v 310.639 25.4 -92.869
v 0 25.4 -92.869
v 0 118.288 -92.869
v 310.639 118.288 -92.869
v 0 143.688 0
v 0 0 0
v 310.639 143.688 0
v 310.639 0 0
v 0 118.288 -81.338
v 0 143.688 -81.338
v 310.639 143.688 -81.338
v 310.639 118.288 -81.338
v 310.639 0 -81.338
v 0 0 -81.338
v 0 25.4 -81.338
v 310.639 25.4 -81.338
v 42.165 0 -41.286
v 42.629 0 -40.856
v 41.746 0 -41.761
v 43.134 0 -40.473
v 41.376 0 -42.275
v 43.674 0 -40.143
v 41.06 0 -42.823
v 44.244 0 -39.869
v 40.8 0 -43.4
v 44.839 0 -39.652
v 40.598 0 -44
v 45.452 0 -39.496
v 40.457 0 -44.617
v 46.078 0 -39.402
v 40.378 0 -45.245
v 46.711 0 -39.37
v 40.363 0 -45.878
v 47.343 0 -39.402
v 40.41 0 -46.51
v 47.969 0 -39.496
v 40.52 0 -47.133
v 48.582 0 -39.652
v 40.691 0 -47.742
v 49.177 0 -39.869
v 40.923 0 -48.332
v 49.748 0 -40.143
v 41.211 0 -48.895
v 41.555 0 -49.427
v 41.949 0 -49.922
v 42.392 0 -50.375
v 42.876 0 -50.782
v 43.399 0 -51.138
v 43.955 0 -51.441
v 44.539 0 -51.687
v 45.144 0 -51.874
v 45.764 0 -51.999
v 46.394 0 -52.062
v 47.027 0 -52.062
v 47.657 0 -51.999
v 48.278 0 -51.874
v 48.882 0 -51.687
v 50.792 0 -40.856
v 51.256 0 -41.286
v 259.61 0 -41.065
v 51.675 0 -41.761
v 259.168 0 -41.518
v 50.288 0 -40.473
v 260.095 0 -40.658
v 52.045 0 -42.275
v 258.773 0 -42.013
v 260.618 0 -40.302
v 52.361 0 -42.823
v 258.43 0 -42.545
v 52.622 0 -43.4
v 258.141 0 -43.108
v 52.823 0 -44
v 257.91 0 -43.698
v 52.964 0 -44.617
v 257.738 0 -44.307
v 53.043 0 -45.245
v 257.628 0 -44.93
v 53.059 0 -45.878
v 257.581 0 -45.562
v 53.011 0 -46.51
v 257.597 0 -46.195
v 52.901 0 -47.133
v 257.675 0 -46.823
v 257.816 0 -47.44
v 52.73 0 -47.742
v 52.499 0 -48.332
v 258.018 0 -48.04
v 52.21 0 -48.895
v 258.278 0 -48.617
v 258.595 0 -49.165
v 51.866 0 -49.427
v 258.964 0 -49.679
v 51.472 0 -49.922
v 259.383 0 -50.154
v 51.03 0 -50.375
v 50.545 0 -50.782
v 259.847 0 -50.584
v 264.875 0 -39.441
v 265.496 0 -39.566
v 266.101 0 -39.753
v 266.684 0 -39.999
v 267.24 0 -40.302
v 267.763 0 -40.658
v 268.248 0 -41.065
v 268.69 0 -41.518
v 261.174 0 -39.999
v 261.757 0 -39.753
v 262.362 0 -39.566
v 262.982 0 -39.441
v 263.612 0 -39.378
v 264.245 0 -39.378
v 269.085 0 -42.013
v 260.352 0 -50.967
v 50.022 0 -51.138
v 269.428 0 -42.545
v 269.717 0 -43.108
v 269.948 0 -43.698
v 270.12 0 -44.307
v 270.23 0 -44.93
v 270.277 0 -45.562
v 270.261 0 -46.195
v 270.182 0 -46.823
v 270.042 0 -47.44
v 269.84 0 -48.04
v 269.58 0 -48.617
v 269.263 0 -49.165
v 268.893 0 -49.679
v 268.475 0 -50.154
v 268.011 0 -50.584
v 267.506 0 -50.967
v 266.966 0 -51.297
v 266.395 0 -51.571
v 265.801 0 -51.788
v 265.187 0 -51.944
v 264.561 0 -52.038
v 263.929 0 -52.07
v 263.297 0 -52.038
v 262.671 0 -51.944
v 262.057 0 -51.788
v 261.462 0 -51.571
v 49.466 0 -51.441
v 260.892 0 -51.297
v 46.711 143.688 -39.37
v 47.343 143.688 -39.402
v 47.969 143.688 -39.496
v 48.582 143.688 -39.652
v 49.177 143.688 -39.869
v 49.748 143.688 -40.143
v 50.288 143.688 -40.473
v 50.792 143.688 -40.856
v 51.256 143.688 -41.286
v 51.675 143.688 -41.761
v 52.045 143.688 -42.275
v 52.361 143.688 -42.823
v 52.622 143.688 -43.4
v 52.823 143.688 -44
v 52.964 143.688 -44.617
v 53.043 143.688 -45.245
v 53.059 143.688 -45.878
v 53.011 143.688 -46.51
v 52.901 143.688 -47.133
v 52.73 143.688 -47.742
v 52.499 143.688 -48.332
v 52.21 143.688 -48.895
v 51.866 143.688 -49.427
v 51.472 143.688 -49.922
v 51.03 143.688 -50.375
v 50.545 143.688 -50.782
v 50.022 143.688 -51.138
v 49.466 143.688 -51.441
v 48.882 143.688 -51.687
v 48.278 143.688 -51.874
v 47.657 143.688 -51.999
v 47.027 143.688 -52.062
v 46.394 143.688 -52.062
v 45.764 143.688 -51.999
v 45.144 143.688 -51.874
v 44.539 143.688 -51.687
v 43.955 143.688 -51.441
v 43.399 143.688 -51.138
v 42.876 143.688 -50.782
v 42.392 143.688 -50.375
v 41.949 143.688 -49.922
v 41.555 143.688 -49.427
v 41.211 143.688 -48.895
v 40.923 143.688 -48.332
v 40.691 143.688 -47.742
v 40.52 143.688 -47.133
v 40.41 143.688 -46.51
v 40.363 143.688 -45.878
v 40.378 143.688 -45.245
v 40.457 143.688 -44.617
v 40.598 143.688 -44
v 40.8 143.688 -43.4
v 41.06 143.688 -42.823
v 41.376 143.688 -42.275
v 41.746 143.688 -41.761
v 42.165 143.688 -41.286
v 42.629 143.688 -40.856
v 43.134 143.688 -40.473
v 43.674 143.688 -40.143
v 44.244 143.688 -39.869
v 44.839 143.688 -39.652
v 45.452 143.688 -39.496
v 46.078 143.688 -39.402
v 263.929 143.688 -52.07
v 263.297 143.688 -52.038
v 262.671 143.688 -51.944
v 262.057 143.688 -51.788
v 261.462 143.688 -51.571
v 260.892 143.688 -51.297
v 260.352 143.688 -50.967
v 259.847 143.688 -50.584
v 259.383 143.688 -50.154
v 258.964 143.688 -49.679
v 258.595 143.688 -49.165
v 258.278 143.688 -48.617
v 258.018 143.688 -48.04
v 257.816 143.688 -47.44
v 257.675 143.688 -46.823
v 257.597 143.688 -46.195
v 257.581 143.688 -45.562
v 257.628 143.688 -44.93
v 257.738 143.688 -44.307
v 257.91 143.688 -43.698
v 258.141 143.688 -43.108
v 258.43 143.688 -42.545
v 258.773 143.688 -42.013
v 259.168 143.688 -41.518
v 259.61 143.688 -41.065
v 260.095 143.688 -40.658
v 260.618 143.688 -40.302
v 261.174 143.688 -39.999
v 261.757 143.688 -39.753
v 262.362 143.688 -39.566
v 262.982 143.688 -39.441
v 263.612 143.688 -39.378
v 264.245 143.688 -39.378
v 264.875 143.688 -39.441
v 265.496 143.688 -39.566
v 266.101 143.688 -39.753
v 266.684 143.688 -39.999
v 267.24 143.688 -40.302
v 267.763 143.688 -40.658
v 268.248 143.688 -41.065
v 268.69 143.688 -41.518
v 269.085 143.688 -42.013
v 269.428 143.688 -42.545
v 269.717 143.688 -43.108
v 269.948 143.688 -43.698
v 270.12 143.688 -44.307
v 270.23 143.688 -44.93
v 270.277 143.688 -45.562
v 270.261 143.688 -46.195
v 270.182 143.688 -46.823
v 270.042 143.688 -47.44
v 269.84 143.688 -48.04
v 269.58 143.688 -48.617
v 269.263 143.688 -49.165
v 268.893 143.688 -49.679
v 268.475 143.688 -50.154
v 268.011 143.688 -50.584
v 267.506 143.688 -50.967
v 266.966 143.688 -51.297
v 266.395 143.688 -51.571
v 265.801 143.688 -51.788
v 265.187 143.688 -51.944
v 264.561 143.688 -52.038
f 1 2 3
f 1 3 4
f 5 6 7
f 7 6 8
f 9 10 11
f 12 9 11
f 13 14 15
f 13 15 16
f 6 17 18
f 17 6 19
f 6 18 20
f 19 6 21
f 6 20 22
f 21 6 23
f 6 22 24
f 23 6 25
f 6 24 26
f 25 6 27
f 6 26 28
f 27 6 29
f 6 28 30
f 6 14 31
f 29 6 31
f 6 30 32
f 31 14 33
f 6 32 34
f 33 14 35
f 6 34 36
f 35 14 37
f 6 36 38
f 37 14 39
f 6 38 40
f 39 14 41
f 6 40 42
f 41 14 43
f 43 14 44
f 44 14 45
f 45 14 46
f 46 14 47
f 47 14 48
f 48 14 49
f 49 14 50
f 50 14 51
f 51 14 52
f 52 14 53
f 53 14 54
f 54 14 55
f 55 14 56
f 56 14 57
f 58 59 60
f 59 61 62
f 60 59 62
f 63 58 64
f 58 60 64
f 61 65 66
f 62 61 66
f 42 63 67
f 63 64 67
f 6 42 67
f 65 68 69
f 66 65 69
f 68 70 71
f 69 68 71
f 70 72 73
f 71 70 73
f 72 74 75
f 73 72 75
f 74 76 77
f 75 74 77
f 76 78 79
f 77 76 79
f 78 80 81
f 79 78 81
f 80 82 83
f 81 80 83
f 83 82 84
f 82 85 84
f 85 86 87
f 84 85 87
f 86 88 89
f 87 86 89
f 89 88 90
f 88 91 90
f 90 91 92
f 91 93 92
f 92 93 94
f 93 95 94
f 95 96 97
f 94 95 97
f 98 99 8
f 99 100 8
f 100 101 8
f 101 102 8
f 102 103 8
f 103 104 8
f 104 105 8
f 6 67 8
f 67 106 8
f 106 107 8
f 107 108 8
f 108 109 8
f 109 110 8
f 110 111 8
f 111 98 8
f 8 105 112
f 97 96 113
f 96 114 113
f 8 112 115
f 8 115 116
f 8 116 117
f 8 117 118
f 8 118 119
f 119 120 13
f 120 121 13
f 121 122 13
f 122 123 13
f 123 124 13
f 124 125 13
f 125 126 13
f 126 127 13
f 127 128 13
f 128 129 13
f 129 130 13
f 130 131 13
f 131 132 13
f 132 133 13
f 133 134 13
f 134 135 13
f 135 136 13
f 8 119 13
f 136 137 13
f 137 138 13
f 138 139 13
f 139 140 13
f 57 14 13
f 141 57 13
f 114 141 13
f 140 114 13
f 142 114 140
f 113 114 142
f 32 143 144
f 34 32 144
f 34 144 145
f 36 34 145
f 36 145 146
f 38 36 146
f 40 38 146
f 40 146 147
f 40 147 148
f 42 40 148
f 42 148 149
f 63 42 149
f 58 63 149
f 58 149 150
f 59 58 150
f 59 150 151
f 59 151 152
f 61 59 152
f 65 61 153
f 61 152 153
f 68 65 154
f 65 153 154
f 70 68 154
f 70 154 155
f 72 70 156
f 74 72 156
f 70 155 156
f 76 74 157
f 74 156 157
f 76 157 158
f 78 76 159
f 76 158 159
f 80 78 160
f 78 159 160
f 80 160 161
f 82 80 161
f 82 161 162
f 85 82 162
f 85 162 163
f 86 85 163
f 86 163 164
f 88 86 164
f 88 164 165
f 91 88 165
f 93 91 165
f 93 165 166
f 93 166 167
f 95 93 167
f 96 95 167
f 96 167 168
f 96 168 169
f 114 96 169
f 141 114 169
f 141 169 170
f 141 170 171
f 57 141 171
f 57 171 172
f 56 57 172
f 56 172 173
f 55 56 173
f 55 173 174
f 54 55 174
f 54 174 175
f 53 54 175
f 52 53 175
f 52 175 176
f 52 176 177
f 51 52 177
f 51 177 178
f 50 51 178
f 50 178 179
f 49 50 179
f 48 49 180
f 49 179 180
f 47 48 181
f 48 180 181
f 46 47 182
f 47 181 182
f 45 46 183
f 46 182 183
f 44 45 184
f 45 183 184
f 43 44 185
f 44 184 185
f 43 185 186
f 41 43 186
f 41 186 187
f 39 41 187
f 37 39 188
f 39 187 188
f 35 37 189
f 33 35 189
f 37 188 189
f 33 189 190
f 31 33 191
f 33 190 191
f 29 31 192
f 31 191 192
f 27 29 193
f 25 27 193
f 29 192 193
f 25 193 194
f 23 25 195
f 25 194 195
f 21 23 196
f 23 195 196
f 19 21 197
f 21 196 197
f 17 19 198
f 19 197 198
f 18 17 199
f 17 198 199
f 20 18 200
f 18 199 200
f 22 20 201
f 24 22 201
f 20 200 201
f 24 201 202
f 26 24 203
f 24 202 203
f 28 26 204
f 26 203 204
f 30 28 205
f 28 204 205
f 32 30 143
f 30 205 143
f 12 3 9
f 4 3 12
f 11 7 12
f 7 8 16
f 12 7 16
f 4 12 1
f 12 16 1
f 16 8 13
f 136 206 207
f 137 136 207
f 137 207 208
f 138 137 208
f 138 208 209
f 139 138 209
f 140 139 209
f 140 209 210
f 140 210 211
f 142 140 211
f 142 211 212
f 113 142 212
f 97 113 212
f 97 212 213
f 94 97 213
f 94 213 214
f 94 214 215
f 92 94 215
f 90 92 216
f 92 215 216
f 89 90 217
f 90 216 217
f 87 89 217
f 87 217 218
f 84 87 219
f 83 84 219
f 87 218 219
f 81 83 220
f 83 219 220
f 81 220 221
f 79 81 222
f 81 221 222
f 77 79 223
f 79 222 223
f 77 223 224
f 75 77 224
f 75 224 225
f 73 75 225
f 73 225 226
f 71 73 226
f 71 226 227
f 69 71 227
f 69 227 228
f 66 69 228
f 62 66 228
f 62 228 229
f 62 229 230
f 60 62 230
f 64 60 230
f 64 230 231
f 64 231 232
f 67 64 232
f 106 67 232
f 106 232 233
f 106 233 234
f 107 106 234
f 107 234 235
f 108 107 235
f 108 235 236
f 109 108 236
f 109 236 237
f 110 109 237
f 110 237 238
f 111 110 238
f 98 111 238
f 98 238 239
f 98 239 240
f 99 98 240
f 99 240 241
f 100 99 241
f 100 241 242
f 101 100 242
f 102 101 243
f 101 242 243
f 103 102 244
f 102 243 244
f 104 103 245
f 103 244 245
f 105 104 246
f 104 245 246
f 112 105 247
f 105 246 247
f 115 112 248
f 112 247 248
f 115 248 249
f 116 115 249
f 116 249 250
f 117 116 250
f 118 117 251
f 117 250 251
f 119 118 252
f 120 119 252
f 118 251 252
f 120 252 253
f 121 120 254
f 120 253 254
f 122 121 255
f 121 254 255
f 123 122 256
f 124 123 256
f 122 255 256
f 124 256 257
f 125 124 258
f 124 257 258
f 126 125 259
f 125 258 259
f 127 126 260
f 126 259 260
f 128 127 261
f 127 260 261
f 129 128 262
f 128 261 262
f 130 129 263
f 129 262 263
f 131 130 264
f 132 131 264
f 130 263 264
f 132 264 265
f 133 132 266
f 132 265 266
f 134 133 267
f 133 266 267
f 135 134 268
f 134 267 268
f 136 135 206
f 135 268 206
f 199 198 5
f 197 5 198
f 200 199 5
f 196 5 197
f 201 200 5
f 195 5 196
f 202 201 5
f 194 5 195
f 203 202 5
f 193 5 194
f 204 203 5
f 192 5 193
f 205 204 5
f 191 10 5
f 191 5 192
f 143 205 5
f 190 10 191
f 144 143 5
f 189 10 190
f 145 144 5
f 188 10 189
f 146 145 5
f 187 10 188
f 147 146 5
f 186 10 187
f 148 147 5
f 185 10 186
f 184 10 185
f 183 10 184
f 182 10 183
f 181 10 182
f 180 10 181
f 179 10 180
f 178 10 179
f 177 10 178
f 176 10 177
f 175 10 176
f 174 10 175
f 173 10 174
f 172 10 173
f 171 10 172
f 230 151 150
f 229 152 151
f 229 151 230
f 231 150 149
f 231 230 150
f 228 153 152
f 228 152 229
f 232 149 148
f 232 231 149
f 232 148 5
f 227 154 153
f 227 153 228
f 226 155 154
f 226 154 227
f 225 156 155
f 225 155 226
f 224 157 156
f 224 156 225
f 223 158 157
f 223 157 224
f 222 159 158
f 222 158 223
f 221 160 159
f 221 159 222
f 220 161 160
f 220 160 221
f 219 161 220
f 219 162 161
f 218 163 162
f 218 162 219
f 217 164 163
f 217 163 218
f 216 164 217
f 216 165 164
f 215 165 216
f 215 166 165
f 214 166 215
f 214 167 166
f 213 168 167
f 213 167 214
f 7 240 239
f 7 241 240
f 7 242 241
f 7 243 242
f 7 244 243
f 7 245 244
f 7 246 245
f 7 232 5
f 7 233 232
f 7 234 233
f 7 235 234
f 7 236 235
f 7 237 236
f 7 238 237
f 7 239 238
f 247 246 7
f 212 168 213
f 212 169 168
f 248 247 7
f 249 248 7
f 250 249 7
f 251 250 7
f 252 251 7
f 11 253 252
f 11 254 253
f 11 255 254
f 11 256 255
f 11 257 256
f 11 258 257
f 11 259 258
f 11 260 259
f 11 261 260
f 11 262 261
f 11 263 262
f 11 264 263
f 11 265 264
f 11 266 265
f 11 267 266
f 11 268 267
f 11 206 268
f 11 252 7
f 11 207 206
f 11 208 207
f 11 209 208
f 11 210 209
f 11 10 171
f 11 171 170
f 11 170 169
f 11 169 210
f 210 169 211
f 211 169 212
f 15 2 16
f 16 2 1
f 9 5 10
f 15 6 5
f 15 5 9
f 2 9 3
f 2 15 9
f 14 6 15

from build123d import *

# Parameters (mm, degrees)
SKETCH1_W           = 310.63946
SKETCH1_H           = 92.869200088
BOSS_EXTRUDE1_DEPTH = 143.6878
SKETCH2_R           = 6.35
CUT_EXTRUDE1_DEPTH  = 355.637485755
SKETCH3_W           = 310.82742
SKETCH3_H           = 12.7
CUT_EXTRUDE2_DEPTH  = 25.4


with BuildPart() as part:
    # Sketch1 → Boss-Extrude1 (new body)
    with BuildSketch(Plane(origin=(0, 0, 0), x_dir=(1, 0, 0), z_dir=(0, 1, 0))):
        with Locations((155.31973, 46.434600044)):
            Rectangle(SKETCH1_W, SKETCH1_H)
    extrude(amount=BOSS_EXTRUDE1_DEPTH)

    # Sketch2 → Cut-Extrude1 (cut, through all)
    with BuildSketch(Plane(origin=(0, 143.6878, 0), x_dir=(1, 0, 0), z_dir=(0, 1, 0))):
        with Locations(Location((46.7106, 45.72, 0), (0, 0, 270))):
            Circle(SKETCH2_R)
        with Locations(Location((263.92886, 45.72, 0), (0, 0, 90))):
            Circle(SKETCH2_R)
    extrude(amount=-CUT_EXTRUDE1_DEPTH, mode=Mode.SUBTRACT)

    # Sketch3 → Cut-Extrude2 (cut)
    with BuildSketch(Plane(origin=(0, 143.6878, 0), x_dir=(1, 0, 0), z_dir=(0, 1, 0))):
        with Locations((155.41371, 87.68842)):
            Rectangle(SKETCH3_W, SKETCH3_H)
    cut_extrude2 = extrude(amount=-CUT_EXTRUDE2_DEPTH, mode=Mode.SUBTRACT)

    # Mirror1: Cut-Extrude2 across plane
    add(cut_extrude2.mirror(Plane.ZX.offset(71.8439)), mode=Mode.SUBTRACT)


solid = part.part
